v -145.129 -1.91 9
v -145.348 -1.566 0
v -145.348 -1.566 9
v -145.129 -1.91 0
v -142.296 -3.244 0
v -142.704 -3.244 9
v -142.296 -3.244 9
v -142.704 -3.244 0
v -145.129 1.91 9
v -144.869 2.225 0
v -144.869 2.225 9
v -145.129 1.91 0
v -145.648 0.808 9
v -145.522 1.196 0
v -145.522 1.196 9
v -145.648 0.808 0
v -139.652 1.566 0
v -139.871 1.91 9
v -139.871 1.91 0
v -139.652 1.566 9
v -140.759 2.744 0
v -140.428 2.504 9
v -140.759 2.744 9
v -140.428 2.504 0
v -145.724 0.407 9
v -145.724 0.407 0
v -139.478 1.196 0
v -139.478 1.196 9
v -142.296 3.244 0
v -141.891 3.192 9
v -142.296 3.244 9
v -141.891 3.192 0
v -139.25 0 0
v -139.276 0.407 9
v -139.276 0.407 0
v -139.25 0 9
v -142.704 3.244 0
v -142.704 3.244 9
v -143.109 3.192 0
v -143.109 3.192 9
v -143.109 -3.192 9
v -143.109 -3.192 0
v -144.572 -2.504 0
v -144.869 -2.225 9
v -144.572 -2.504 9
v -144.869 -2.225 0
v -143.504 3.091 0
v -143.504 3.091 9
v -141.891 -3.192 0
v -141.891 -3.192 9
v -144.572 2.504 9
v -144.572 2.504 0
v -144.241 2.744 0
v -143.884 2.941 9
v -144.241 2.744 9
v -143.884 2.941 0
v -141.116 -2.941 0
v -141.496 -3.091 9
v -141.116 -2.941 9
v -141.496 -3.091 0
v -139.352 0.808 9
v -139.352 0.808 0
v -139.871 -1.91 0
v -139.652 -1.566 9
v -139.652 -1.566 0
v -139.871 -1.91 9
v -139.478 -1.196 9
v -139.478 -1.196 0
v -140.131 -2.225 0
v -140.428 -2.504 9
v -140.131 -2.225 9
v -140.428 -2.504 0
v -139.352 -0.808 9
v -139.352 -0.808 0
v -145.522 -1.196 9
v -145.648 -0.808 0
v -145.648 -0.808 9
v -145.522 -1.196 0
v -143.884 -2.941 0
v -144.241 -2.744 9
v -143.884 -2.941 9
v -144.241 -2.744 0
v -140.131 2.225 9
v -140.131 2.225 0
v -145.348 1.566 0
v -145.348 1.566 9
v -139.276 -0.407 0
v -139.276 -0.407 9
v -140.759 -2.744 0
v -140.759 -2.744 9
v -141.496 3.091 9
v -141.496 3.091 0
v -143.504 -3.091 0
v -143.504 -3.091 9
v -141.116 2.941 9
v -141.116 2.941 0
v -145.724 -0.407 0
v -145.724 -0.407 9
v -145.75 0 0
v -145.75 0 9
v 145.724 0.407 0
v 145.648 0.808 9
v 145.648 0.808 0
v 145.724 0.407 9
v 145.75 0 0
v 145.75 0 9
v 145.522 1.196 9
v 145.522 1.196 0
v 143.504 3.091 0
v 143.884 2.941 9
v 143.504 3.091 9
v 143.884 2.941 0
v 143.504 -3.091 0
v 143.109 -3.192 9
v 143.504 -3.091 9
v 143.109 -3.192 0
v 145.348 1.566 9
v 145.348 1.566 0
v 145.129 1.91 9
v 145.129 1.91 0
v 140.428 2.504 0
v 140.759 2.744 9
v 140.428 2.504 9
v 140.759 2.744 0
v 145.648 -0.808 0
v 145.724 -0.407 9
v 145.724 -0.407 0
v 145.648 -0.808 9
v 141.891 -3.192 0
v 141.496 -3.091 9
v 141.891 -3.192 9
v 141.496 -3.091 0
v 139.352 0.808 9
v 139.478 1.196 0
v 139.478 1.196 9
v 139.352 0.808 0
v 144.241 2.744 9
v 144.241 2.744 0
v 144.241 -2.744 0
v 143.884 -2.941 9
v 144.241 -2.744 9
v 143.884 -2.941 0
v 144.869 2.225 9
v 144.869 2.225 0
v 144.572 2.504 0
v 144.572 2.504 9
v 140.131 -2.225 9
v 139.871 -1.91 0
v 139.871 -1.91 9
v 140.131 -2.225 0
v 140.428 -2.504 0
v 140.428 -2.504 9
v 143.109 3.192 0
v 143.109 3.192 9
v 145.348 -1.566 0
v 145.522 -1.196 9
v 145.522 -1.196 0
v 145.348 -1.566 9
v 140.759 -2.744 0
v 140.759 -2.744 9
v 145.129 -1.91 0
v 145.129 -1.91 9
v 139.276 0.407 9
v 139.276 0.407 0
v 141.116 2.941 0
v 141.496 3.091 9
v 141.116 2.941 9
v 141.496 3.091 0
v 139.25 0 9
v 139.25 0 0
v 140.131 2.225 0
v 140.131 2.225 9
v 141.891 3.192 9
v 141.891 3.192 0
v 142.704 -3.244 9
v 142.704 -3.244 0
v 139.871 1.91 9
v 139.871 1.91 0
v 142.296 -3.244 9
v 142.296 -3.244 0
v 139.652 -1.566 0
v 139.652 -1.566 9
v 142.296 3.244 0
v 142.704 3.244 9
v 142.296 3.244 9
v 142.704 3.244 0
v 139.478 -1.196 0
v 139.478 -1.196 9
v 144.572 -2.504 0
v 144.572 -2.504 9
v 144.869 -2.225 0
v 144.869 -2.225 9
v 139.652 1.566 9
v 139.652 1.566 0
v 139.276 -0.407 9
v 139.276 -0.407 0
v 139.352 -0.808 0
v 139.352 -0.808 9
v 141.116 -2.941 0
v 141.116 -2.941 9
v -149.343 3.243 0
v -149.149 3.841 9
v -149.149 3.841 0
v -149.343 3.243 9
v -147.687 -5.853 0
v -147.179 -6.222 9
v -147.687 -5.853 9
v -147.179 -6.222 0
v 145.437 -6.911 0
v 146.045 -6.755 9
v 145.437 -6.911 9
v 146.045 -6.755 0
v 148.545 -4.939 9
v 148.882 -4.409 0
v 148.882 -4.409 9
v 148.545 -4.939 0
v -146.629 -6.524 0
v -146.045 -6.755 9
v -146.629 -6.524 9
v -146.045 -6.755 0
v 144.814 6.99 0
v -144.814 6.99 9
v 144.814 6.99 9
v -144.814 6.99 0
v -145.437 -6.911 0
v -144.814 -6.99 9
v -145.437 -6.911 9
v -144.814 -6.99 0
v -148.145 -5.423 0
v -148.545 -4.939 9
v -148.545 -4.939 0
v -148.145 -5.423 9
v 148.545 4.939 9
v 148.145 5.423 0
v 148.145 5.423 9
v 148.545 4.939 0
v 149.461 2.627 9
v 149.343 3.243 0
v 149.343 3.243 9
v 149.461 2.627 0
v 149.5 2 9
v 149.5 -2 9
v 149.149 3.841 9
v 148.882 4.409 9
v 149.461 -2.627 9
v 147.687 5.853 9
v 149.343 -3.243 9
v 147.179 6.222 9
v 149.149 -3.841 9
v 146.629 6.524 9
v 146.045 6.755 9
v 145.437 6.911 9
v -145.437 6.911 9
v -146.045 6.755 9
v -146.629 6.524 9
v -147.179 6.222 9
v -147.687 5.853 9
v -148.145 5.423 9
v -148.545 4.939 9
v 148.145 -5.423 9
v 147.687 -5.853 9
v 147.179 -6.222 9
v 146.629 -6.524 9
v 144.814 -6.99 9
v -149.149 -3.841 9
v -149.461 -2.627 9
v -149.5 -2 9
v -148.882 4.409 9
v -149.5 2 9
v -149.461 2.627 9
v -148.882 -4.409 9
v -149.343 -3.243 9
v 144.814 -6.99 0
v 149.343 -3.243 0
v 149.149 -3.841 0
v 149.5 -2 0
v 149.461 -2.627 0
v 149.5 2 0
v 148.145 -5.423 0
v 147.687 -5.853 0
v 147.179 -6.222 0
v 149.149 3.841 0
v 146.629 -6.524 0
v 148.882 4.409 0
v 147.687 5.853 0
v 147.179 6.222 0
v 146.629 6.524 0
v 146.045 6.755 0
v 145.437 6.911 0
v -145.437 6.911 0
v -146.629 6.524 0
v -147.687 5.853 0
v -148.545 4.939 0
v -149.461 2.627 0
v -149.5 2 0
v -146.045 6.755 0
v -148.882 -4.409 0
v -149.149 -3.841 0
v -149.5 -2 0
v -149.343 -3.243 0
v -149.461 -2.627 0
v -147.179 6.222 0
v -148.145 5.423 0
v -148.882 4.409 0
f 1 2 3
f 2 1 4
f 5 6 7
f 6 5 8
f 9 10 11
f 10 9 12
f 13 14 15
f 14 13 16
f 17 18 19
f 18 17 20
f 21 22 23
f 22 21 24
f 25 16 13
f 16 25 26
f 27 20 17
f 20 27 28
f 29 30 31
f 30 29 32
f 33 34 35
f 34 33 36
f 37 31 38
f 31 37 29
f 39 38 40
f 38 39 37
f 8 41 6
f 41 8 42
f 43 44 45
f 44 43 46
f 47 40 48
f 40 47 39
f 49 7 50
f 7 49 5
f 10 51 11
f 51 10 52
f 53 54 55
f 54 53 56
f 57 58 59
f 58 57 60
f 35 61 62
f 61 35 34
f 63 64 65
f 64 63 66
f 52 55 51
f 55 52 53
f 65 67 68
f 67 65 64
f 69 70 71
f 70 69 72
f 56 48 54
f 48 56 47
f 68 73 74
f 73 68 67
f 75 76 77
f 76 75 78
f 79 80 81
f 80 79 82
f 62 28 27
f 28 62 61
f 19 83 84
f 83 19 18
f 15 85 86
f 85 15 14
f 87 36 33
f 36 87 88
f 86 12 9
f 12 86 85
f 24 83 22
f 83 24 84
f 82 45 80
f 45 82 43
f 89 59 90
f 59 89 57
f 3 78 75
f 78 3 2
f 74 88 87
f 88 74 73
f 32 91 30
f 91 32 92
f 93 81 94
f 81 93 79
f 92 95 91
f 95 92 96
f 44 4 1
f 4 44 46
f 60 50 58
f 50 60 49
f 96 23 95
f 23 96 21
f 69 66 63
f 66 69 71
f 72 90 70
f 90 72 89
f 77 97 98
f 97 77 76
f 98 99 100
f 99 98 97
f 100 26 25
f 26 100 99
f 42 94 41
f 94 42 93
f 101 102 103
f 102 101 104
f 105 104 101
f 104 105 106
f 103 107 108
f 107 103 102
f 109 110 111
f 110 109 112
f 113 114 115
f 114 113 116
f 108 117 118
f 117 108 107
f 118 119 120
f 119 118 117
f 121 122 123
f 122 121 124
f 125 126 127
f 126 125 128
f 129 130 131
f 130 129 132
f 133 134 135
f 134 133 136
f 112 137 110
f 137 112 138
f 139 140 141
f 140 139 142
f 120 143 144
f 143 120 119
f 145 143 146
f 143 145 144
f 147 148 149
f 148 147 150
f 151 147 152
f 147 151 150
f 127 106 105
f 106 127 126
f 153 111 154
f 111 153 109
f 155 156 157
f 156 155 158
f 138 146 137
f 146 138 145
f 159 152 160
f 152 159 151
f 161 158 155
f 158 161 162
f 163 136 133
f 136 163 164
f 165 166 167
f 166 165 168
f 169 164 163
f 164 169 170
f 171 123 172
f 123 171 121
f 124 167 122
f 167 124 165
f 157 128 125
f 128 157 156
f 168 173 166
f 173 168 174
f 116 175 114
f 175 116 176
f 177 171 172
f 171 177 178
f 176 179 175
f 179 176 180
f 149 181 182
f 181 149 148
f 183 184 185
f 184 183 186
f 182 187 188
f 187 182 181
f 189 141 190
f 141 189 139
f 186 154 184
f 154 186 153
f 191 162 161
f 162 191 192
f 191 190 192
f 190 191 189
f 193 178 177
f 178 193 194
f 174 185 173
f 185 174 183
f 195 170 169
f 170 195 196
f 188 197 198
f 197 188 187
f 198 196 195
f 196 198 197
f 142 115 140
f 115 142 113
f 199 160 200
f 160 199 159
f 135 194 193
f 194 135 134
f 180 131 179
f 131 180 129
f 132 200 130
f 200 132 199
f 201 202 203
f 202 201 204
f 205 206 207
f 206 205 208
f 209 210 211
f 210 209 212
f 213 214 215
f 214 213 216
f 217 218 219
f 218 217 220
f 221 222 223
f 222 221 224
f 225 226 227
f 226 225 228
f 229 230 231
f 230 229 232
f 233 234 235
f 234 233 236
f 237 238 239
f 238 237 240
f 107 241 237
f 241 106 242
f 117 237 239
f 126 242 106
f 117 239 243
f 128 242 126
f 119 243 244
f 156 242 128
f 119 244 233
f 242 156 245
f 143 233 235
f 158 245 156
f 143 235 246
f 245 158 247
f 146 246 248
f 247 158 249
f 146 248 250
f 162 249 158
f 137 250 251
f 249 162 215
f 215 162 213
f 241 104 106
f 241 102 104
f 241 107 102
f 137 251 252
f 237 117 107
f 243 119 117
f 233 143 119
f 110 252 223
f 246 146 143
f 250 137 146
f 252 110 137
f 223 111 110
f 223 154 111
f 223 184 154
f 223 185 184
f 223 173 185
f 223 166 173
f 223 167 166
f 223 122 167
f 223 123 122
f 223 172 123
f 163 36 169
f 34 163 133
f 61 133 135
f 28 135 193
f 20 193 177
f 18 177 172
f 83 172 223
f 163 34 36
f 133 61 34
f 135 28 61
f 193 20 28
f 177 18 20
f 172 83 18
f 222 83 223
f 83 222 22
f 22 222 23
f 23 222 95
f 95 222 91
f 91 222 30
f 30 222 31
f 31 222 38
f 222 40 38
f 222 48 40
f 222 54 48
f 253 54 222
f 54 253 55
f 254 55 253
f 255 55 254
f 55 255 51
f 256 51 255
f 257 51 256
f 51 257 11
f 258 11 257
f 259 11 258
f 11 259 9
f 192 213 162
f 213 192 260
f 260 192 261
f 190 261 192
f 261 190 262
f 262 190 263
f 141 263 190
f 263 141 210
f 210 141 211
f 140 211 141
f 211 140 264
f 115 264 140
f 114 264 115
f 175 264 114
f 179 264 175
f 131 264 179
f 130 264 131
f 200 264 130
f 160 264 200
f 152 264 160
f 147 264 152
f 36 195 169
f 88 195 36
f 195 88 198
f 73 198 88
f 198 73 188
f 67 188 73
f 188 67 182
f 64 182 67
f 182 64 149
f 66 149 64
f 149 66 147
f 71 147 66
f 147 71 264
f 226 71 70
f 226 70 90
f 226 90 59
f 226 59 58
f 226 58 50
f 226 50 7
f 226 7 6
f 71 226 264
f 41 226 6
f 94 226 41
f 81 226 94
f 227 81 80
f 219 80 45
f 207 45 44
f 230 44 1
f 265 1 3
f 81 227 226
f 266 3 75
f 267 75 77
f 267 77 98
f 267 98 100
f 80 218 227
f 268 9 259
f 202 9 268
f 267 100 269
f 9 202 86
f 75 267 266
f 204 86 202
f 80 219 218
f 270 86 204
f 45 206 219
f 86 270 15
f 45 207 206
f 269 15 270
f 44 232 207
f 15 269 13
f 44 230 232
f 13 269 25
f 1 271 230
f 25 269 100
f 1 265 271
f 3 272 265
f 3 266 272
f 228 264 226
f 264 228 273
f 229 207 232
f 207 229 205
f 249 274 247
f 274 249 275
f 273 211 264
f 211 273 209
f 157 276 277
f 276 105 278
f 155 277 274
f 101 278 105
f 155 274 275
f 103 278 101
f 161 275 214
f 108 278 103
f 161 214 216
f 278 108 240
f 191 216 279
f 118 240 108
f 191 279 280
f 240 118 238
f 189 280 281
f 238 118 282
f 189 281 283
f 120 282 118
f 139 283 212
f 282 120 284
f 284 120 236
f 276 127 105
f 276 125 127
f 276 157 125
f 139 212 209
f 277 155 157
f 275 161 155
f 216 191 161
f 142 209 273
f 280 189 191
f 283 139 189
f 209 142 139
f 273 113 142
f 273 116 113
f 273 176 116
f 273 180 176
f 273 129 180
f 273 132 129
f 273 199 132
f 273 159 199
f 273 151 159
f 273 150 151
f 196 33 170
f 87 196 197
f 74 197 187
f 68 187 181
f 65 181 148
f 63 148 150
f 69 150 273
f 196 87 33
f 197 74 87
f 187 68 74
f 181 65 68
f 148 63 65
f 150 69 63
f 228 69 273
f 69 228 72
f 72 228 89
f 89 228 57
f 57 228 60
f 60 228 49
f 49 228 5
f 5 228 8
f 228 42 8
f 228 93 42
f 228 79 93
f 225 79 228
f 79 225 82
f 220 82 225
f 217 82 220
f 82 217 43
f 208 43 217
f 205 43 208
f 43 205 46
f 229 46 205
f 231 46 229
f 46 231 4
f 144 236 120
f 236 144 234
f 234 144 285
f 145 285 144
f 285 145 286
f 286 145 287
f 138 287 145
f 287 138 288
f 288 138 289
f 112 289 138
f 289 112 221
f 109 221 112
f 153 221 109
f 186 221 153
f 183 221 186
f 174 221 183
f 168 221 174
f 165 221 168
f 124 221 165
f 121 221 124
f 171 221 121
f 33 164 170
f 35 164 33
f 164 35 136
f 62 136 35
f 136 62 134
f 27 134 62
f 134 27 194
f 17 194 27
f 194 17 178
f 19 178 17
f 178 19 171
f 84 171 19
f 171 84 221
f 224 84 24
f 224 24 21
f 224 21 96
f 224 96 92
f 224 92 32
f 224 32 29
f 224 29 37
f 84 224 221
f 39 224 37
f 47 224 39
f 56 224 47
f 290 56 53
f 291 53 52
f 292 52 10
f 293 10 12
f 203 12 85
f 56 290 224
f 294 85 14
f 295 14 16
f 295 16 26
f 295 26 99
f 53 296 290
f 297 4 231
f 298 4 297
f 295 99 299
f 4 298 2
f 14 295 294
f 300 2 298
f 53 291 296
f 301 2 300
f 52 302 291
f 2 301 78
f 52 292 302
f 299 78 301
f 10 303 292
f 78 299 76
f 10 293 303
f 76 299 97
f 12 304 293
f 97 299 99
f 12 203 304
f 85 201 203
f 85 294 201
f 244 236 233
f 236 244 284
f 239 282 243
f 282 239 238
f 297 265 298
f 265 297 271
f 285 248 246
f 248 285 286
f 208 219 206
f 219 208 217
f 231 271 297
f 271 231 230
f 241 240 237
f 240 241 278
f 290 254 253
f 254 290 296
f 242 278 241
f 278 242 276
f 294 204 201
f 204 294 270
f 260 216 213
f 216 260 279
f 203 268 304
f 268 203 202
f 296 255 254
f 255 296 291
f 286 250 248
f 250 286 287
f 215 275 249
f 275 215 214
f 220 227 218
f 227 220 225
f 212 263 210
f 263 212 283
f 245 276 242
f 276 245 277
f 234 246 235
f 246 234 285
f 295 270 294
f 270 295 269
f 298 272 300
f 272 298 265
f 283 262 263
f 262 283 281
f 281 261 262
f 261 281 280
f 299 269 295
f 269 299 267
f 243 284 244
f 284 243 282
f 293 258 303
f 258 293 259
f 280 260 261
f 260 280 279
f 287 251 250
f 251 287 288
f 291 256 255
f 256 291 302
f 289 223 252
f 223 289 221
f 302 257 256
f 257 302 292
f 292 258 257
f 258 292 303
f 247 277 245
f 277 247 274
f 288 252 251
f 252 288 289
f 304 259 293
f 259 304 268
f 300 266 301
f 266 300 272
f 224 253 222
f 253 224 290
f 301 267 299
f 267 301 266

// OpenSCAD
$fn = 50;


difference() {
	union() {
		hull() {
			translate(v = [-144.5000000000, 2.0000000000, 0]) {
				cylinder(h = 9, r = 5);
			}
			translate(v = [144.5000000000, 2.0000000000, 0]) {
				cylinder(h = 9, r = 5);
			}
			translate(v = [-144.5000000000, -2.0000000000, 0]) {
				cylinder(h = 9, r = 5);
			}
			translate(v = [144.5000000000, -2.0000000000, 0]) {
				cylinder(h = 9, r = 5);
			}
		}
	}
	union() {
		translate(v = [-142.5000000000, 0.0000000000, -100.0000000000]) {
			cylinder(h = 200, r = 3.2500000000);
		}
		translate(v = [-142.5000000000, 0.0000000000, -100.0000000000]) {
			cylinder(h = 200, r = 3.2500000000);
		}
		translate(v = [142.5000000000, 0.0000000000, -100.0000000000]) {
			cylinder(h = 200, r = 3.2500000000);
		}
		translate(v = [142.5000000000, 0.0000000000, -100.0000000000]) {
			cylinder(h = 200, r = 3.2500000000);
		}
	}
}
